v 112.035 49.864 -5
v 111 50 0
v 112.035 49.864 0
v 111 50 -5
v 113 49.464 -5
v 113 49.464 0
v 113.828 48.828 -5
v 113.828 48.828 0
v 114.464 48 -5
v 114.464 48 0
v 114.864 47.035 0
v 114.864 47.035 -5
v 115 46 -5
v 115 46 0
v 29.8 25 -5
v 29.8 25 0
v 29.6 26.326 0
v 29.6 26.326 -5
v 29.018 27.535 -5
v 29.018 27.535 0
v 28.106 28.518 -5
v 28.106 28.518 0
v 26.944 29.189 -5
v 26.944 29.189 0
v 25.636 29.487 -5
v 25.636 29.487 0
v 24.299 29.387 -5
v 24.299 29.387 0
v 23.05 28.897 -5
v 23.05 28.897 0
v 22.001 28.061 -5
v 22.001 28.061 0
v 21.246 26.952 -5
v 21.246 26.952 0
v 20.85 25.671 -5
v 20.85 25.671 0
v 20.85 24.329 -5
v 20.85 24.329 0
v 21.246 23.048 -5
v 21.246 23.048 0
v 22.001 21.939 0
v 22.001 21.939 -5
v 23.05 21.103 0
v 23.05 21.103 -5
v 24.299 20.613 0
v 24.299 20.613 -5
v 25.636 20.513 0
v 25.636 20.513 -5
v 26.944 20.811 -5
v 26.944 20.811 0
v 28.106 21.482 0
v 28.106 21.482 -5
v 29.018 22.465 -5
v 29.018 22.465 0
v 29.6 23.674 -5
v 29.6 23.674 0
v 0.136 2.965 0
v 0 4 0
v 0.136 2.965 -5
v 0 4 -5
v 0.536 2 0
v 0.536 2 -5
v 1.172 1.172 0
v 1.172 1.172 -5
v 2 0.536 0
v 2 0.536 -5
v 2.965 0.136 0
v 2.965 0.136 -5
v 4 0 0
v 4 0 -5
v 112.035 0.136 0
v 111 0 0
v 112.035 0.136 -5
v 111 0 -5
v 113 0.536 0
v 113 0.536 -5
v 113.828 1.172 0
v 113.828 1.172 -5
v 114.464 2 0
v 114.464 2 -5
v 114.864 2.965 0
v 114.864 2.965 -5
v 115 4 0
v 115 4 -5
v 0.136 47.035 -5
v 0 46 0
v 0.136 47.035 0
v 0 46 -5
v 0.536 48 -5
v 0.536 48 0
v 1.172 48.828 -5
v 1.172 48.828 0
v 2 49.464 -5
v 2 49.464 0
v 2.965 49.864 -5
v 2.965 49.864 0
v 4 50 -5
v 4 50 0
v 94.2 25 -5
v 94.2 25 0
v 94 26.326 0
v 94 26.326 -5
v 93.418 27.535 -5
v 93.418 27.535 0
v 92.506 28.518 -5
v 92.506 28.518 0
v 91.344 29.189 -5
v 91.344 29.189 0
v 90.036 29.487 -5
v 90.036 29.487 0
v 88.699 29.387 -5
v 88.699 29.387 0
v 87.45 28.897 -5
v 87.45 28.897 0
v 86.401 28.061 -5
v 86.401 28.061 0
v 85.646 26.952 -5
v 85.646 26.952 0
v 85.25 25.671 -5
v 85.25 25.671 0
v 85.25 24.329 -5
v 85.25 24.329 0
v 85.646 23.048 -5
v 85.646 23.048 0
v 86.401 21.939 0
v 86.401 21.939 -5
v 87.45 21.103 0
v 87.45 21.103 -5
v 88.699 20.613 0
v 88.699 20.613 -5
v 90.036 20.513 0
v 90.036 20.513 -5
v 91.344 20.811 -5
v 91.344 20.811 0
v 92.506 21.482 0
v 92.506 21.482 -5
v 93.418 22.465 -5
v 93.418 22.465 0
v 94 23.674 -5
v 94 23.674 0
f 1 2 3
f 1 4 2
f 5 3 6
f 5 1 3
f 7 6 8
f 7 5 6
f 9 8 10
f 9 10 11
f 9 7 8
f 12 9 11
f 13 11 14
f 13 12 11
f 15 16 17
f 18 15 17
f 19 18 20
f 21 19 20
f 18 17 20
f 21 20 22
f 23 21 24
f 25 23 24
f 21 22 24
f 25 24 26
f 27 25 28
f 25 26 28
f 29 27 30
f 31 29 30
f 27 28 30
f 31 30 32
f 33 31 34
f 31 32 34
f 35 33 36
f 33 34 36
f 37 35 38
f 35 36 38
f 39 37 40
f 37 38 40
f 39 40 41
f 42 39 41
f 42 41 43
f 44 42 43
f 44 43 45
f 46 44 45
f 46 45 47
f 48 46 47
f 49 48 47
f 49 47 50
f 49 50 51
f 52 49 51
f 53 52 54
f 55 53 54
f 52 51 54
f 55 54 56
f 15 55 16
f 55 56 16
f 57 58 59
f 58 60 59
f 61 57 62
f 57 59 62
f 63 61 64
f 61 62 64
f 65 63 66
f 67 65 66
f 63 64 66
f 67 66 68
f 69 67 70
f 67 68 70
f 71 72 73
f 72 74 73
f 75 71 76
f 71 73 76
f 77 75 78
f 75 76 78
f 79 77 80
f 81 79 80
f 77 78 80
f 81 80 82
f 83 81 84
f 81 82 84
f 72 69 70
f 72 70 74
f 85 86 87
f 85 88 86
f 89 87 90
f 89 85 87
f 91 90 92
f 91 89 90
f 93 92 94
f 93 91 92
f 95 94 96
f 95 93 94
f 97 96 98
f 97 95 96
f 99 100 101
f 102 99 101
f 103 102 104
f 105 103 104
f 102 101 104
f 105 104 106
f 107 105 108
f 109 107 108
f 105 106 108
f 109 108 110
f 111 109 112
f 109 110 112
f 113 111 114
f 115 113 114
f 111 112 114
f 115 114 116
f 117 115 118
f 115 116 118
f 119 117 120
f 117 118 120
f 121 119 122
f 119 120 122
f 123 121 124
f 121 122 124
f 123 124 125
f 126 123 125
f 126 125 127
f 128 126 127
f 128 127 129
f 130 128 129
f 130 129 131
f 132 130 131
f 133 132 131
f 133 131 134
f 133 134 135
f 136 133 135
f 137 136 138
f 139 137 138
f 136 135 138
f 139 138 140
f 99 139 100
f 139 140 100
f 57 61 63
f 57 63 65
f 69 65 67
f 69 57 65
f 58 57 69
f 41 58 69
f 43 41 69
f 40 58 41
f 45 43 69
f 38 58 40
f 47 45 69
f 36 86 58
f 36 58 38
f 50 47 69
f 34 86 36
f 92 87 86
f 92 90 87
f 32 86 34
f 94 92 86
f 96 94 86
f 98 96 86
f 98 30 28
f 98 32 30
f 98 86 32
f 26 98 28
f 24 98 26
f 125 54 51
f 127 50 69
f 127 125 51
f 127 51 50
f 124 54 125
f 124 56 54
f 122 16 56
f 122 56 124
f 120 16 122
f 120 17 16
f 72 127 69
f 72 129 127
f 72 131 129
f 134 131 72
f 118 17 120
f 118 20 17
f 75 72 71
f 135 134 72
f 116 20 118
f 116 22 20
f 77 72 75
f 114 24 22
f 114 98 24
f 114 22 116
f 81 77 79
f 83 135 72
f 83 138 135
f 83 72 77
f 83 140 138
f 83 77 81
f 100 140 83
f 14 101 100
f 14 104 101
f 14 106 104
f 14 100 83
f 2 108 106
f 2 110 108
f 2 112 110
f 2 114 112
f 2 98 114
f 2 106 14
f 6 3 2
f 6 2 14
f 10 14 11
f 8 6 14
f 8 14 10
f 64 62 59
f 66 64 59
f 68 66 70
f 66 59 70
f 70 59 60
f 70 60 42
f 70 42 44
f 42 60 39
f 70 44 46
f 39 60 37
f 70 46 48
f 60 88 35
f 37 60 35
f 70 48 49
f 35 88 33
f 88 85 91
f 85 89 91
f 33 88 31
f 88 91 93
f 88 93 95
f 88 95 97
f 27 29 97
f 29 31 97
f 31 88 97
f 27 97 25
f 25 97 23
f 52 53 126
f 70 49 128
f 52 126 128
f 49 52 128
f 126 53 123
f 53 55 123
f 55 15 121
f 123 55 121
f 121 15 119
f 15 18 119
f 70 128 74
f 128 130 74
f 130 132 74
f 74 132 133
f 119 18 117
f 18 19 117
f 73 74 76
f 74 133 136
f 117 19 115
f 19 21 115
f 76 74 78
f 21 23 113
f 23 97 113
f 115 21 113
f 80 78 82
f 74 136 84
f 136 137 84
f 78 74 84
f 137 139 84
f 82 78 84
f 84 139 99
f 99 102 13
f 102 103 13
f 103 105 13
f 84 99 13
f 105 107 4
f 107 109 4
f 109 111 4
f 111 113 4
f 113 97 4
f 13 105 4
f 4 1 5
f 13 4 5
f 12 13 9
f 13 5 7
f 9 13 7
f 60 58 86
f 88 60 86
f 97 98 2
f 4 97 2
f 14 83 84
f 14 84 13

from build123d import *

# Parameters (mm, degrees)
F0_W     = 115
F0_H     = 50
F0_R     = 4.5
F1_DEPTH = 5
F2_R     = 4


with BuildPart() as f1:
    # F0 (on Top) → F1 (new body)
    with BuildSketch(Plane.XY):
        with Locations((57.5, 25)):
            Rectangle(F0_W, F0_H)
        with Locations((25.3, 25)):
            Circle(F0_R, mode=Mode.SUBTRACT)
        with Locations((89.7, 25)):
            Circle(F0_R, mode=Mode.SUBTRACT)
    extrude(amount=-F1_DEPTH)

    # F2
    f2_edges = [f1.edges().sort_by_distance(p)[0] for p in [
        (115, 0, -2.5),
        (0, 0, -2.5),
        (115, 50, -2.5),
        (0, 50, -2.5),
    ]]
    fillet(f2_edges, radius=F2_R)


solid = f1.part
